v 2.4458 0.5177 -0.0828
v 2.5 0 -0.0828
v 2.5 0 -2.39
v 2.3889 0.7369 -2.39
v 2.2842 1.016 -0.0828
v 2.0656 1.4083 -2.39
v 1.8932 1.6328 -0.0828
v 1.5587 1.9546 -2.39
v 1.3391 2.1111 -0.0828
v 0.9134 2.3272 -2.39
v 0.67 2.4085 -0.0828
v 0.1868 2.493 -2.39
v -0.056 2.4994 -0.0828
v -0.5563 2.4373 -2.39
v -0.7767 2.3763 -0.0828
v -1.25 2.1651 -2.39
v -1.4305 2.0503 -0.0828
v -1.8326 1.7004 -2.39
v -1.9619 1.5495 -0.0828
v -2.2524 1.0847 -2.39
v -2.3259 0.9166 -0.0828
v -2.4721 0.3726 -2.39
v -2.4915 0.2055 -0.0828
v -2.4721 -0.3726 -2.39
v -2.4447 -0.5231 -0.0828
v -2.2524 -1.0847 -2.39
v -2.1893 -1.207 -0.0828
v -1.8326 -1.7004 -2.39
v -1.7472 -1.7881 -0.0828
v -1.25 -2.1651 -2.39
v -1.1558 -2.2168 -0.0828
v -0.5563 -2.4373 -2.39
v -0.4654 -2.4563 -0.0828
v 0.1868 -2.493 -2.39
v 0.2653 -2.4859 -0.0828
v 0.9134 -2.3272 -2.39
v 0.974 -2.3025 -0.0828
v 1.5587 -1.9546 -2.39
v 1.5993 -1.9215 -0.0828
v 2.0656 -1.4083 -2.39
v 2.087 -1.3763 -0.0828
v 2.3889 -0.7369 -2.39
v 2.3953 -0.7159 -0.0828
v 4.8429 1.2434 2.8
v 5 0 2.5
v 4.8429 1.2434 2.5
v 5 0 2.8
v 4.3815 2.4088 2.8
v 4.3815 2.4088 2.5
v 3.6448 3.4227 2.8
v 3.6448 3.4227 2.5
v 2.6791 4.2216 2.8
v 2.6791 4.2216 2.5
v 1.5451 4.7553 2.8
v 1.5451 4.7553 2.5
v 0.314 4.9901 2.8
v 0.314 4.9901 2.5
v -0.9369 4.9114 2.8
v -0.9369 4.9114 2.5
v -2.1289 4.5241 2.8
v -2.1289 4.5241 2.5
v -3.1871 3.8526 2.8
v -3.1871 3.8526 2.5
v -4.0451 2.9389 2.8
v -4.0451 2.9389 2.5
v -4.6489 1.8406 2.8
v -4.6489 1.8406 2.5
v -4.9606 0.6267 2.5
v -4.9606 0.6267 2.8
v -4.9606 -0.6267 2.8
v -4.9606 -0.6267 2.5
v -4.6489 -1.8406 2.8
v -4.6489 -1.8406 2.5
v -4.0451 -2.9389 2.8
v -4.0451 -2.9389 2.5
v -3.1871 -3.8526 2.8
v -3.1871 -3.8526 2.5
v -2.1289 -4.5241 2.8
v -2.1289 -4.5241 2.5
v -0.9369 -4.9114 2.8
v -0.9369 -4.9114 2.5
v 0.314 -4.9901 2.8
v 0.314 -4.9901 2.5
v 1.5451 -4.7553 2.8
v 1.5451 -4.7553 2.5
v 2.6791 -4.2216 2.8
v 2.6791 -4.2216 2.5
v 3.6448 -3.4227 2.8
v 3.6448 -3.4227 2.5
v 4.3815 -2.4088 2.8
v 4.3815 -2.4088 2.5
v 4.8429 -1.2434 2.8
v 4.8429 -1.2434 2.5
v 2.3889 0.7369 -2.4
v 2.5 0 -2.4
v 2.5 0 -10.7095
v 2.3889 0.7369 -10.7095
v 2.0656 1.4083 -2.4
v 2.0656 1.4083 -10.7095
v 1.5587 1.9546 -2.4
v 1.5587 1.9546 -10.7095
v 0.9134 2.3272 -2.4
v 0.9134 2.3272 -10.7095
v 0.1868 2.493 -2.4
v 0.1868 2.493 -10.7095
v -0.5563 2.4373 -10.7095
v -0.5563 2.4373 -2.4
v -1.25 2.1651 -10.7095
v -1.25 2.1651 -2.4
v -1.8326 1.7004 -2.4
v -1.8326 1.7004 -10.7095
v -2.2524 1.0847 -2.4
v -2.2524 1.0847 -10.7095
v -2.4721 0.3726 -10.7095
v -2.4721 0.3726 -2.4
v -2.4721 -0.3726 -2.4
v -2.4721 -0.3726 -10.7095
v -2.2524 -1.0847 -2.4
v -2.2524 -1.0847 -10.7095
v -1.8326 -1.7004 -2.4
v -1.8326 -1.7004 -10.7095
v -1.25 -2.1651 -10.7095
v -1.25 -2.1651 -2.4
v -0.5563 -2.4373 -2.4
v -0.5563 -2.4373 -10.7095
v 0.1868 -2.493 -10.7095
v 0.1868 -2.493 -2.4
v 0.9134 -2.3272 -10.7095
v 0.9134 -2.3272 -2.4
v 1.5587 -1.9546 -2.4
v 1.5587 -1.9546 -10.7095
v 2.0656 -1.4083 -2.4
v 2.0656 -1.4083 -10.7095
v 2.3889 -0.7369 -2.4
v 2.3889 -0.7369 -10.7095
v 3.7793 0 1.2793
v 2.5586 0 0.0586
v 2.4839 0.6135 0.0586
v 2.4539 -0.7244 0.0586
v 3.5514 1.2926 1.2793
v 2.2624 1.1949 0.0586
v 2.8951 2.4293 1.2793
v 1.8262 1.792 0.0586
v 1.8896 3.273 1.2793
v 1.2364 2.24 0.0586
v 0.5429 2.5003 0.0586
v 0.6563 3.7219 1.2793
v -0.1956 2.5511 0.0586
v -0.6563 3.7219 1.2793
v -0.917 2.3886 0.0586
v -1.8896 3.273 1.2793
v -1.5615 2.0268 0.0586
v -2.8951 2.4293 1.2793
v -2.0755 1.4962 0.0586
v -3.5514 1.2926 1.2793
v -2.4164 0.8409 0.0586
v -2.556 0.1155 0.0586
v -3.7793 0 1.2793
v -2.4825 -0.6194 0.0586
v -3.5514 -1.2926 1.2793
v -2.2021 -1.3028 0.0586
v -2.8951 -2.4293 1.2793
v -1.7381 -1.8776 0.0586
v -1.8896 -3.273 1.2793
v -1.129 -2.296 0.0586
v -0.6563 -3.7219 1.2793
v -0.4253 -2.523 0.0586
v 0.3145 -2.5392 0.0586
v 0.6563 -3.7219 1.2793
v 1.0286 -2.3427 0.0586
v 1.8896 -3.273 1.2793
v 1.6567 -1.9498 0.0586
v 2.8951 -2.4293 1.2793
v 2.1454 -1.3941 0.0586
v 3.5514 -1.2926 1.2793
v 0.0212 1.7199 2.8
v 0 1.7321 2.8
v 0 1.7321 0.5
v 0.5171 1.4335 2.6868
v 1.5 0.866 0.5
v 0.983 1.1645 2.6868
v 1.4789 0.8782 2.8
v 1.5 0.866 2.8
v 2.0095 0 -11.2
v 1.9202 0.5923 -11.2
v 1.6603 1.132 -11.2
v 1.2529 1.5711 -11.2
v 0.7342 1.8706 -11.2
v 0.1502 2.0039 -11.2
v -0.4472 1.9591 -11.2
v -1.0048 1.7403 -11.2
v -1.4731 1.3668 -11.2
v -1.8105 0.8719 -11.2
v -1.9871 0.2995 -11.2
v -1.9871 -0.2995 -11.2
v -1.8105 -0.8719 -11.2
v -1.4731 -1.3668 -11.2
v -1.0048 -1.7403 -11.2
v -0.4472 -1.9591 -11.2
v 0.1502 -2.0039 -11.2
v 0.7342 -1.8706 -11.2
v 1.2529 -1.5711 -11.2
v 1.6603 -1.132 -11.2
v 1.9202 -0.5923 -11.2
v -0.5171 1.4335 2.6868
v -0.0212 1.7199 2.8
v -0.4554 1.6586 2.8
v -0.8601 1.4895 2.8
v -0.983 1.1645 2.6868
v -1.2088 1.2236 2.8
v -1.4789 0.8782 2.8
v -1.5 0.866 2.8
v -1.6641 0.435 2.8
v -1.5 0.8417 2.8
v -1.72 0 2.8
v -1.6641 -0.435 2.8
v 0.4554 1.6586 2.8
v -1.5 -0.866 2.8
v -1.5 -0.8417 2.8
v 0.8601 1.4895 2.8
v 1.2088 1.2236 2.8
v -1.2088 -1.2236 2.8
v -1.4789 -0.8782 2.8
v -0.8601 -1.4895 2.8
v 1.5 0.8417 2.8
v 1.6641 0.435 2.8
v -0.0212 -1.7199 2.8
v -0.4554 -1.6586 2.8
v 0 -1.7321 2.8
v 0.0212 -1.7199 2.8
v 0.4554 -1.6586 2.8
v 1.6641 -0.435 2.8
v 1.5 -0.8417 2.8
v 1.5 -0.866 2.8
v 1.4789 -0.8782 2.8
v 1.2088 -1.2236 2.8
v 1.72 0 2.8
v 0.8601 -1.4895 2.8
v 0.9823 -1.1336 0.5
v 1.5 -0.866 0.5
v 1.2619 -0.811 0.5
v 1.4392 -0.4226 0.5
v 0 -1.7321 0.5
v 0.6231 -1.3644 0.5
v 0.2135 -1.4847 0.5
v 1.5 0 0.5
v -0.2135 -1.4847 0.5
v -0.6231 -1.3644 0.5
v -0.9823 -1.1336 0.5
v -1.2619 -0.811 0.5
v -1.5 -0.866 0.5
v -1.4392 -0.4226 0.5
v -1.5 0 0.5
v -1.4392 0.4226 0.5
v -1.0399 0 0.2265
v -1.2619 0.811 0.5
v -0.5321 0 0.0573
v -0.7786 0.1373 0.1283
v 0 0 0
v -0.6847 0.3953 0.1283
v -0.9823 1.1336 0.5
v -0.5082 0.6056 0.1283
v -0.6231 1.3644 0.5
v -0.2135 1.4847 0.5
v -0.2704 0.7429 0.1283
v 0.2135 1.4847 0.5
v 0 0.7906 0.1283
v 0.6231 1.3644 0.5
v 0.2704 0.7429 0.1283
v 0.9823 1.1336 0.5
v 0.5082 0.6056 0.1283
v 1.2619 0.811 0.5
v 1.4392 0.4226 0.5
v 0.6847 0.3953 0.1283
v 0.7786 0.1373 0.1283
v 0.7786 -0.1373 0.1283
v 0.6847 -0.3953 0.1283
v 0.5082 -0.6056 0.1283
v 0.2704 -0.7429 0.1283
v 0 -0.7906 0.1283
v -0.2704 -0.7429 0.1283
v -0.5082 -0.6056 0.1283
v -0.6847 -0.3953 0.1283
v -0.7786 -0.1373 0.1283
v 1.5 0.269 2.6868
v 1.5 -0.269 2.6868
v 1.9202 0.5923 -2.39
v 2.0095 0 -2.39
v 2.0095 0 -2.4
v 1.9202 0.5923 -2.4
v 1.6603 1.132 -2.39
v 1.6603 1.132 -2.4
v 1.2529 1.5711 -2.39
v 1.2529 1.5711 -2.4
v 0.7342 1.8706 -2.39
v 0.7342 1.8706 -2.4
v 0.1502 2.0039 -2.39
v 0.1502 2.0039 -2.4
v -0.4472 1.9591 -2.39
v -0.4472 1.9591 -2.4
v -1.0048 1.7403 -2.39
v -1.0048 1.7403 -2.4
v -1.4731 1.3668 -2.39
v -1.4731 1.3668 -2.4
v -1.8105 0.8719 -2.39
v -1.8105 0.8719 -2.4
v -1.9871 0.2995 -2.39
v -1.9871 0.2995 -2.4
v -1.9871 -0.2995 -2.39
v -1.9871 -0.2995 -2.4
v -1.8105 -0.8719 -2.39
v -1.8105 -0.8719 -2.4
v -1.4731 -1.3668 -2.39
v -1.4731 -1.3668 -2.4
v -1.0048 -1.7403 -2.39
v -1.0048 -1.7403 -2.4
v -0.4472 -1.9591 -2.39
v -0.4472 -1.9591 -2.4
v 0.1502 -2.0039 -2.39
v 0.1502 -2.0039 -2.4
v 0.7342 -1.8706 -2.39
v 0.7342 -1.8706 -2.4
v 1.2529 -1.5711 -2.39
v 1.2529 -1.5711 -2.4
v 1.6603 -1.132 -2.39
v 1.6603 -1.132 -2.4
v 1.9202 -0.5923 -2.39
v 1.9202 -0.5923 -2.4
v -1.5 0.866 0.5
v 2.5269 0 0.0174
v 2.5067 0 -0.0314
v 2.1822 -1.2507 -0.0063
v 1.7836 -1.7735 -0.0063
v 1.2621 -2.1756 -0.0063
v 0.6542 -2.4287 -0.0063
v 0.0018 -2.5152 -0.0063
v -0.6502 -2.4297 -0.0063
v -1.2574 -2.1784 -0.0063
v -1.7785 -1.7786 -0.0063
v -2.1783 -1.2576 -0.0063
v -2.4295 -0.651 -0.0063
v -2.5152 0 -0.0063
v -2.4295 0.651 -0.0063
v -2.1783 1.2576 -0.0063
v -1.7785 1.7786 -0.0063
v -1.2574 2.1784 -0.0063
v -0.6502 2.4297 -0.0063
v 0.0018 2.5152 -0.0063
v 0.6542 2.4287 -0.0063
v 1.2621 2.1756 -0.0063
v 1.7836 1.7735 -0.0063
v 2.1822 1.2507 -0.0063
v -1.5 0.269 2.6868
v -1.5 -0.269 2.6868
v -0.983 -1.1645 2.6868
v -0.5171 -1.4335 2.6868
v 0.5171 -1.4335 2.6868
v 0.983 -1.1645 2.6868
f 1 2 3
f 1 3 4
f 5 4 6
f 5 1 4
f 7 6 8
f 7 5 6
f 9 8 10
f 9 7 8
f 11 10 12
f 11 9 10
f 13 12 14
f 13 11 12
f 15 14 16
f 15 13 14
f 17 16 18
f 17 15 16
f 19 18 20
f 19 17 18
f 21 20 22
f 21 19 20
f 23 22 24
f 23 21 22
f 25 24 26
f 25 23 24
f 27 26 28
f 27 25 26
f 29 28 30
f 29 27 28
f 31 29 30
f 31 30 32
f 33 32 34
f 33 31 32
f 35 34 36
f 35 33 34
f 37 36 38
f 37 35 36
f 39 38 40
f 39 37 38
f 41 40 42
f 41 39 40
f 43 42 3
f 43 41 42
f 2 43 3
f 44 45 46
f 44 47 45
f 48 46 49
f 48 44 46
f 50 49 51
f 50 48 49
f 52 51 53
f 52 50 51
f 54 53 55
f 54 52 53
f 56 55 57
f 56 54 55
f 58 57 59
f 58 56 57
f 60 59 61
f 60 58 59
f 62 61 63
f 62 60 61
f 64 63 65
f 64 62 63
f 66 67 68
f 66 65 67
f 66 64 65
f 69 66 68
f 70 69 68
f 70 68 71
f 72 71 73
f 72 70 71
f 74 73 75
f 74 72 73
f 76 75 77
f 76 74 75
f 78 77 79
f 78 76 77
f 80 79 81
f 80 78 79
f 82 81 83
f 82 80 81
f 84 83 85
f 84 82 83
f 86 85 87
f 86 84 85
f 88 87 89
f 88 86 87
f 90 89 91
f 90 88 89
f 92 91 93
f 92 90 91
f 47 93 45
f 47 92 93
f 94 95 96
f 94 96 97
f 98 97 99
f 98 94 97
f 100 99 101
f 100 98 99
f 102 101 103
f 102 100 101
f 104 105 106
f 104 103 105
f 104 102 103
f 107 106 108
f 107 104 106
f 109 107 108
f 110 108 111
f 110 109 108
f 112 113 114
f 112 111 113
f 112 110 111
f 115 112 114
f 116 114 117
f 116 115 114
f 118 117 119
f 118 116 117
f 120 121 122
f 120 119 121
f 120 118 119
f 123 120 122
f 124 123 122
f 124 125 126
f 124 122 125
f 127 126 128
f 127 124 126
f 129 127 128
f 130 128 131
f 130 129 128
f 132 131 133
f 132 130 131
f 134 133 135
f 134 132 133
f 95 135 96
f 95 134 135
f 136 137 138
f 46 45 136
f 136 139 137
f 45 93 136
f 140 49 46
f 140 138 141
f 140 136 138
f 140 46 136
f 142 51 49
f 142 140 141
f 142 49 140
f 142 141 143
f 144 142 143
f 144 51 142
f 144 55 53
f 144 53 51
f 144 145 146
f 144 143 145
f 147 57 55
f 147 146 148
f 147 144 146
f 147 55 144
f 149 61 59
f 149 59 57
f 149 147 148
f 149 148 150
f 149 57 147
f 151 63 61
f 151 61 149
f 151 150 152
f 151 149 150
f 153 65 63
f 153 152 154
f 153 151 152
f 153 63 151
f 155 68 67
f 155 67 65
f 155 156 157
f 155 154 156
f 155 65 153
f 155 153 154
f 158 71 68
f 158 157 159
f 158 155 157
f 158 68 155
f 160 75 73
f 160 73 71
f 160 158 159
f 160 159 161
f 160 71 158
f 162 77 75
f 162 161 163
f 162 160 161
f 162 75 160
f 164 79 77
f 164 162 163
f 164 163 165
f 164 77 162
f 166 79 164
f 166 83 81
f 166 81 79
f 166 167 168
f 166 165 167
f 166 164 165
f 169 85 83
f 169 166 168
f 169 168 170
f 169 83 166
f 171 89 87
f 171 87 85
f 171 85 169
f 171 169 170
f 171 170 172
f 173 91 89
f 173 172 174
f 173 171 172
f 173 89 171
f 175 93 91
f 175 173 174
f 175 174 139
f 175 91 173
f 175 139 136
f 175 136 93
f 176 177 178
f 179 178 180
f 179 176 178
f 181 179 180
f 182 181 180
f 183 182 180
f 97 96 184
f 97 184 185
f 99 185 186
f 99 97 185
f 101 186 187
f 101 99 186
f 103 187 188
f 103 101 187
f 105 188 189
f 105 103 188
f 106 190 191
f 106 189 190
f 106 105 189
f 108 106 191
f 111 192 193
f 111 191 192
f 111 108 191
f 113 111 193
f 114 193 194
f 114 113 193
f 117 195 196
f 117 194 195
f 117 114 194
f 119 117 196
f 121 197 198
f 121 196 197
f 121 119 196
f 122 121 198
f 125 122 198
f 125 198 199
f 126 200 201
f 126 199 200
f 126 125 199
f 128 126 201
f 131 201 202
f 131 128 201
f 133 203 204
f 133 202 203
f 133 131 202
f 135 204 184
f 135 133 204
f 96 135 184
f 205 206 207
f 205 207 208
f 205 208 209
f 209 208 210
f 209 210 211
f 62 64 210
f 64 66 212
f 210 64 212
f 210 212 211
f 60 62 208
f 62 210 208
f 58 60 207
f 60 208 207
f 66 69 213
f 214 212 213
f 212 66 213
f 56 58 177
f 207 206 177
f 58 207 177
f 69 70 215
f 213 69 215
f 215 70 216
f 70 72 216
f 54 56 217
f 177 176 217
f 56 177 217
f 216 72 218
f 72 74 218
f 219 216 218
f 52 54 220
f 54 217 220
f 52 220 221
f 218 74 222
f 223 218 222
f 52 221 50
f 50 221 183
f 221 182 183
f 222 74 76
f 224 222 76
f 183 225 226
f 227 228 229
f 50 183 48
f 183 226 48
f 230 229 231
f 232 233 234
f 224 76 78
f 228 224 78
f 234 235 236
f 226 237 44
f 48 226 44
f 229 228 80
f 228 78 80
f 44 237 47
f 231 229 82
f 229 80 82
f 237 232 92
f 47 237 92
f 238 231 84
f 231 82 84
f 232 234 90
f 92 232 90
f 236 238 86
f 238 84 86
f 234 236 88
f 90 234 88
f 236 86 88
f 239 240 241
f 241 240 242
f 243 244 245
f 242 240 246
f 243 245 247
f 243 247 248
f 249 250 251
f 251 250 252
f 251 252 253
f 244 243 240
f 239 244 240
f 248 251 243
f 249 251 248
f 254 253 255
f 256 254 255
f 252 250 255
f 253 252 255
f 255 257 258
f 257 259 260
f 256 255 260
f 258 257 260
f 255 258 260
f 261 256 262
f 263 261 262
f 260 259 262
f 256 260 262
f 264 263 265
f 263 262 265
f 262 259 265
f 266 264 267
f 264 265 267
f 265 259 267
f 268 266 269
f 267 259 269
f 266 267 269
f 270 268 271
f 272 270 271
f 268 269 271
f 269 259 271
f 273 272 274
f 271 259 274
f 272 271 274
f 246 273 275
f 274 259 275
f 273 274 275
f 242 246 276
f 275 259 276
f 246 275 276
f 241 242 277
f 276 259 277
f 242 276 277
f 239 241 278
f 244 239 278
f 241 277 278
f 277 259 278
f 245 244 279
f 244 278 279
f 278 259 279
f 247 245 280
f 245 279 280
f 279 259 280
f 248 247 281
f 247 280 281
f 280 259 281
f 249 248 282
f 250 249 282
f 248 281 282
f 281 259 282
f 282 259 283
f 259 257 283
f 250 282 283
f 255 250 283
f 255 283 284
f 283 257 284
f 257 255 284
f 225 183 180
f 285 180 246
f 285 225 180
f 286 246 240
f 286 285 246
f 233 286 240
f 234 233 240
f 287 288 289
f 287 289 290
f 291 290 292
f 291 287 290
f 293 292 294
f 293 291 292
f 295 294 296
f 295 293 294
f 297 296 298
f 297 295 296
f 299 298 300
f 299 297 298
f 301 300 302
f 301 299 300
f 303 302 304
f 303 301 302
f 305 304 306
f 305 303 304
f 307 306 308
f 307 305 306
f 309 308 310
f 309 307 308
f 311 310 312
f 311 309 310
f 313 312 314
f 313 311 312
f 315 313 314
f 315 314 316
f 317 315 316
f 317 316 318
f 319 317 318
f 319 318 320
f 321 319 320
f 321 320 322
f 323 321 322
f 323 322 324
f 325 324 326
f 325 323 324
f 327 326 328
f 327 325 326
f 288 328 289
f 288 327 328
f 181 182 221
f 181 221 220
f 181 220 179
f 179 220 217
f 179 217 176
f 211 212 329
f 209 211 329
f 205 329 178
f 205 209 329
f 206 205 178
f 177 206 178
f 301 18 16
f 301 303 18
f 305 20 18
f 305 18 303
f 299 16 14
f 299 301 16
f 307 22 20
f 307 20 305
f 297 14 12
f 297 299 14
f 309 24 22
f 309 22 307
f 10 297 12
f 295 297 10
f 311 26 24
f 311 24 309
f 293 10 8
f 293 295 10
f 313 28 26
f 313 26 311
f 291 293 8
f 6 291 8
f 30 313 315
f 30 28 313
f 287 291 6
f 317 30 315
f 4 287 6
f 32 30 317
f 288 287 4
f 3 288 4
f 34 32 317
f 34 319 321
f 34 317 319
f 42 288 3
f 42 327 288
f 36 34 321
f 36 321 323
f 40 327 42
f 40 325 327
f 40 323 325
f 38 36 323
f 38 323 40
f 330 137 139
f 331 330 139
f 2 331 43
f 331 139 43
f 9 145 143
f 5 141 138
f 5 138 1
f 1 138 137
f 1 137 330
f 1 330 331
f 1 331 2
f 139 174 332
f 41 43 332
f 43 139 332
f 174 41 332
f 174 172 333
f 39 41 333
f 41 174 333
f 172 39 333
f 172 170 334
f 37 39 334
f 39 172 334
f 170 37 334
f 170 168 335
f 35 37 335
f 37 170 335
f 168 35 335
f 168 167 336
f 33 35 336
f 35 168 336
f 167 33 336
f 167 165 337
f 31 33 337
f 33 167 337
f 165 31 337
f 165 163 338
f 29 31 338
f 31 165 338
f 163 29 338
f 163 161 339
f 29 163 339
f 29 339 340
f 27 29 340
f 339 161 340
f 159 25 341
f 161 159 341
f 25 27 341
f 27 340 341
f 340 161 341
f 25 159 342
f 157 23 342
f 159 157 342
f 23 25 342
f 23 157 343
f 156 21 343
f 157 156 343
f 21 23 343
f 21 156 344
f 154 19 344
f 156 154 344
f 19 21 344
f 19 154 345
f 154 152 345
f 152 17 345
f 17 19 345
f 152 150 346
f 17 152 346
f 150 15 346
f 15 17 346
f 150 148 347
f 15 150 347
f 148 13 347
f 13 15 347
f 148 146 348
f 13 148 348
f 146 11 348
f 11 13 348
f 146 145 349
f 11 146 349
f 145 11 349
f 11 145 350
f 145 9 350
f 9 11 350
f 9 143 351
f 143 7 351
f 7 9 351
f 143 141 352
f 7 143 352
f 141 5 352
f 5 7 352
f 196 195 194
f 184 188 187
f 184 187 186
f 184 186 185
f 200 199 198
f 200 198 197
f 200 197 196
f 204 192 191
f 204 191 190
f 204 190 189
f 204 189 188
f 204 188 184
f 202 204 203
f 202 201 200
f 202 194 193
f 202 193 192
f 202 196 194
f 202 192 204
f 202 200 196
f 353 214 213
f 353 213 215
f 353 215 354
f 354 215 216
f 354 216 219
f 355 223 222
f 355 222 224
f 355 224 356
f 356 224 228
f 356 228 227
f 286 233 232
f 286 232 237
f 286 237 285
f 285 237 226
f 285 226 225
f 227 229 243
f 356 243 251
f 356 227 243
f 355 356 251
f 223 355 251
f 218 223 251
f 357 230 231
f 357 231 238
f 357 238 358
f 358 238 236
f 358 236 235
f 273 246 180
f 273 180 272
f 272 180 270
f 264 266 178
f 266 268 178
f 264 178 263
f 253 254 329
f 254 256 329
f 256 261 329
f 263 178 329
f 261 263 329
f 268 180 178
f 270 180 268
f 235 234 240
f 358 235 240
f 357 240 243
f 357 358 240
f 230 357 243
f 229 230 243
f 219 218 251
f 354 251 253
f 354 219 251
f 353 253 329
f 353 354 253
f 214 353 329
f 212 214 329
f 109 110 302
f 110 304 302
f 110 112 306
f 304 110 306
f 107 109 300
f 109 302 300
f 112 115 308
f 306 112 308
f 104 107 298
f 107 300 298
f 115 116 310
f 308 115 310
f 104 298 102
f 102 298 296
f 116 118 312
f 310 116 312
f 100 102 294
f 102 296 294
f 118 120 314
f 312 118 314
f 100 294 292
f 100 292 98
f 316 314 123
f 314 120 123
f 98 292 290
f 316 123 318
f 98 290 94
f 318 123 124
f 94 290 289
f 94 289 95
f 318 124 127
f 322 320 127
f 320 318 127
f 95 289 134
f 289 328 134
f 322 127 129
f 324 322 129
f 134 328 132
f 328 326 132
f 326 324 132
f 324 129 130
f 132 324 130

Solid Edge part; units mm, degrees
sketch "Sketch1" plane through (0, 0, 0) normal (0, -1, 0) x (1, 0, 0)
  line L0 (2.5, 0) -> (5, 2.5)
  line L1 (5, 2.5) -> (5, 2.8)
  line L2 (5, 2.8) -> (0, 2.8)
  line L3 (0, 2.8) -> (0, -11.2)
  line L4 (0, -11.2) -> (2.0095, -11.2)
  line L5 (2.0095, -11.2) -> (2.5, -10.7095)
  line L6 (2.5, -10.7095) -> (2.5, -2.4)
  line L7 (2.5, -2.4) -> (2.0095, -2.4)
  line L8 (2.0095, -2.4) -> (2.0095, -2.39)
  line L9 (2.0095, -2.39) -> (2.5, -2.39)
  line L10 (2.5, -2.39) -> (2.5, 0)
  dimension "D1" = 14
  dimension "D2" = 5
  dimension "D3" = 2.8
  dimension "D4" = 0.01
  dimension "D5" = 2.0095
  dimension "D6" = 5.2
  dimension "D7" = 0.3
revolve "RevolvedProtrusion1" add sketch "Sketch1" angle 360 about axis through (0, 0, 54) along (0, 0, -1)
sketch "Sketch2" plane through (0, 0, 0) normal (0, -1, 0) x (1, 0, 0)
  arc A0 (-1.5, 0.5) -> (0, 0) centre (0, 2.5) ccw
  line L0 (0, 0.5) -> (0, 0)
  line L1 (-1.5, 0.5) -> (0, 0.5)
  dimension "D1" = 11.7
revolve "RevolvedCutout1" cut sketch "Sketch2" angle 360 about axis through (0, 0, 54) along (0, 0, -1)
sketch "Sketch3" plane through (0, 0, 2.8) normal (0, 0, 1) x (0, -1, 0)
  line L0 (-1.7321, 0) -> (-0.866, 1.5)
  line L1 (-0.866, 1.5) -> (0.866, 1.5)
  line L2 (0.866, 1.5) -> (1.7321, 0)
  line L3 (1.7321, 0) -> (0.866, -1.5)
  line L4 (0.866, -1.5) -> (-0.866, -1.5)
  line L5 (-0.866, -1.5) -> (-1.7321, 0)
  dimension "D1" = 3
extrude "Cutout1" cut sketch "Sketch3" against normal blind 2.3
cosmetic_thread "Thread1" size "M5"
sketch "Sketch4" plane through (0, 0, 0) normal (1, 0, 0) x (0, 1, 0)
  line L0 (-1.72, 2.8) -> (0, 1.807)
revolve "RevolvedCutout2" cut sketch "Sketch4" angle 360 about axis through (0, 0, -57) along (0, 0, 1) material side at (0, -0.835, 2.3468)
fillet "Round1" radius 0.2 1 edges at (-2.5, 0, 0)
properties material "Stahl"
